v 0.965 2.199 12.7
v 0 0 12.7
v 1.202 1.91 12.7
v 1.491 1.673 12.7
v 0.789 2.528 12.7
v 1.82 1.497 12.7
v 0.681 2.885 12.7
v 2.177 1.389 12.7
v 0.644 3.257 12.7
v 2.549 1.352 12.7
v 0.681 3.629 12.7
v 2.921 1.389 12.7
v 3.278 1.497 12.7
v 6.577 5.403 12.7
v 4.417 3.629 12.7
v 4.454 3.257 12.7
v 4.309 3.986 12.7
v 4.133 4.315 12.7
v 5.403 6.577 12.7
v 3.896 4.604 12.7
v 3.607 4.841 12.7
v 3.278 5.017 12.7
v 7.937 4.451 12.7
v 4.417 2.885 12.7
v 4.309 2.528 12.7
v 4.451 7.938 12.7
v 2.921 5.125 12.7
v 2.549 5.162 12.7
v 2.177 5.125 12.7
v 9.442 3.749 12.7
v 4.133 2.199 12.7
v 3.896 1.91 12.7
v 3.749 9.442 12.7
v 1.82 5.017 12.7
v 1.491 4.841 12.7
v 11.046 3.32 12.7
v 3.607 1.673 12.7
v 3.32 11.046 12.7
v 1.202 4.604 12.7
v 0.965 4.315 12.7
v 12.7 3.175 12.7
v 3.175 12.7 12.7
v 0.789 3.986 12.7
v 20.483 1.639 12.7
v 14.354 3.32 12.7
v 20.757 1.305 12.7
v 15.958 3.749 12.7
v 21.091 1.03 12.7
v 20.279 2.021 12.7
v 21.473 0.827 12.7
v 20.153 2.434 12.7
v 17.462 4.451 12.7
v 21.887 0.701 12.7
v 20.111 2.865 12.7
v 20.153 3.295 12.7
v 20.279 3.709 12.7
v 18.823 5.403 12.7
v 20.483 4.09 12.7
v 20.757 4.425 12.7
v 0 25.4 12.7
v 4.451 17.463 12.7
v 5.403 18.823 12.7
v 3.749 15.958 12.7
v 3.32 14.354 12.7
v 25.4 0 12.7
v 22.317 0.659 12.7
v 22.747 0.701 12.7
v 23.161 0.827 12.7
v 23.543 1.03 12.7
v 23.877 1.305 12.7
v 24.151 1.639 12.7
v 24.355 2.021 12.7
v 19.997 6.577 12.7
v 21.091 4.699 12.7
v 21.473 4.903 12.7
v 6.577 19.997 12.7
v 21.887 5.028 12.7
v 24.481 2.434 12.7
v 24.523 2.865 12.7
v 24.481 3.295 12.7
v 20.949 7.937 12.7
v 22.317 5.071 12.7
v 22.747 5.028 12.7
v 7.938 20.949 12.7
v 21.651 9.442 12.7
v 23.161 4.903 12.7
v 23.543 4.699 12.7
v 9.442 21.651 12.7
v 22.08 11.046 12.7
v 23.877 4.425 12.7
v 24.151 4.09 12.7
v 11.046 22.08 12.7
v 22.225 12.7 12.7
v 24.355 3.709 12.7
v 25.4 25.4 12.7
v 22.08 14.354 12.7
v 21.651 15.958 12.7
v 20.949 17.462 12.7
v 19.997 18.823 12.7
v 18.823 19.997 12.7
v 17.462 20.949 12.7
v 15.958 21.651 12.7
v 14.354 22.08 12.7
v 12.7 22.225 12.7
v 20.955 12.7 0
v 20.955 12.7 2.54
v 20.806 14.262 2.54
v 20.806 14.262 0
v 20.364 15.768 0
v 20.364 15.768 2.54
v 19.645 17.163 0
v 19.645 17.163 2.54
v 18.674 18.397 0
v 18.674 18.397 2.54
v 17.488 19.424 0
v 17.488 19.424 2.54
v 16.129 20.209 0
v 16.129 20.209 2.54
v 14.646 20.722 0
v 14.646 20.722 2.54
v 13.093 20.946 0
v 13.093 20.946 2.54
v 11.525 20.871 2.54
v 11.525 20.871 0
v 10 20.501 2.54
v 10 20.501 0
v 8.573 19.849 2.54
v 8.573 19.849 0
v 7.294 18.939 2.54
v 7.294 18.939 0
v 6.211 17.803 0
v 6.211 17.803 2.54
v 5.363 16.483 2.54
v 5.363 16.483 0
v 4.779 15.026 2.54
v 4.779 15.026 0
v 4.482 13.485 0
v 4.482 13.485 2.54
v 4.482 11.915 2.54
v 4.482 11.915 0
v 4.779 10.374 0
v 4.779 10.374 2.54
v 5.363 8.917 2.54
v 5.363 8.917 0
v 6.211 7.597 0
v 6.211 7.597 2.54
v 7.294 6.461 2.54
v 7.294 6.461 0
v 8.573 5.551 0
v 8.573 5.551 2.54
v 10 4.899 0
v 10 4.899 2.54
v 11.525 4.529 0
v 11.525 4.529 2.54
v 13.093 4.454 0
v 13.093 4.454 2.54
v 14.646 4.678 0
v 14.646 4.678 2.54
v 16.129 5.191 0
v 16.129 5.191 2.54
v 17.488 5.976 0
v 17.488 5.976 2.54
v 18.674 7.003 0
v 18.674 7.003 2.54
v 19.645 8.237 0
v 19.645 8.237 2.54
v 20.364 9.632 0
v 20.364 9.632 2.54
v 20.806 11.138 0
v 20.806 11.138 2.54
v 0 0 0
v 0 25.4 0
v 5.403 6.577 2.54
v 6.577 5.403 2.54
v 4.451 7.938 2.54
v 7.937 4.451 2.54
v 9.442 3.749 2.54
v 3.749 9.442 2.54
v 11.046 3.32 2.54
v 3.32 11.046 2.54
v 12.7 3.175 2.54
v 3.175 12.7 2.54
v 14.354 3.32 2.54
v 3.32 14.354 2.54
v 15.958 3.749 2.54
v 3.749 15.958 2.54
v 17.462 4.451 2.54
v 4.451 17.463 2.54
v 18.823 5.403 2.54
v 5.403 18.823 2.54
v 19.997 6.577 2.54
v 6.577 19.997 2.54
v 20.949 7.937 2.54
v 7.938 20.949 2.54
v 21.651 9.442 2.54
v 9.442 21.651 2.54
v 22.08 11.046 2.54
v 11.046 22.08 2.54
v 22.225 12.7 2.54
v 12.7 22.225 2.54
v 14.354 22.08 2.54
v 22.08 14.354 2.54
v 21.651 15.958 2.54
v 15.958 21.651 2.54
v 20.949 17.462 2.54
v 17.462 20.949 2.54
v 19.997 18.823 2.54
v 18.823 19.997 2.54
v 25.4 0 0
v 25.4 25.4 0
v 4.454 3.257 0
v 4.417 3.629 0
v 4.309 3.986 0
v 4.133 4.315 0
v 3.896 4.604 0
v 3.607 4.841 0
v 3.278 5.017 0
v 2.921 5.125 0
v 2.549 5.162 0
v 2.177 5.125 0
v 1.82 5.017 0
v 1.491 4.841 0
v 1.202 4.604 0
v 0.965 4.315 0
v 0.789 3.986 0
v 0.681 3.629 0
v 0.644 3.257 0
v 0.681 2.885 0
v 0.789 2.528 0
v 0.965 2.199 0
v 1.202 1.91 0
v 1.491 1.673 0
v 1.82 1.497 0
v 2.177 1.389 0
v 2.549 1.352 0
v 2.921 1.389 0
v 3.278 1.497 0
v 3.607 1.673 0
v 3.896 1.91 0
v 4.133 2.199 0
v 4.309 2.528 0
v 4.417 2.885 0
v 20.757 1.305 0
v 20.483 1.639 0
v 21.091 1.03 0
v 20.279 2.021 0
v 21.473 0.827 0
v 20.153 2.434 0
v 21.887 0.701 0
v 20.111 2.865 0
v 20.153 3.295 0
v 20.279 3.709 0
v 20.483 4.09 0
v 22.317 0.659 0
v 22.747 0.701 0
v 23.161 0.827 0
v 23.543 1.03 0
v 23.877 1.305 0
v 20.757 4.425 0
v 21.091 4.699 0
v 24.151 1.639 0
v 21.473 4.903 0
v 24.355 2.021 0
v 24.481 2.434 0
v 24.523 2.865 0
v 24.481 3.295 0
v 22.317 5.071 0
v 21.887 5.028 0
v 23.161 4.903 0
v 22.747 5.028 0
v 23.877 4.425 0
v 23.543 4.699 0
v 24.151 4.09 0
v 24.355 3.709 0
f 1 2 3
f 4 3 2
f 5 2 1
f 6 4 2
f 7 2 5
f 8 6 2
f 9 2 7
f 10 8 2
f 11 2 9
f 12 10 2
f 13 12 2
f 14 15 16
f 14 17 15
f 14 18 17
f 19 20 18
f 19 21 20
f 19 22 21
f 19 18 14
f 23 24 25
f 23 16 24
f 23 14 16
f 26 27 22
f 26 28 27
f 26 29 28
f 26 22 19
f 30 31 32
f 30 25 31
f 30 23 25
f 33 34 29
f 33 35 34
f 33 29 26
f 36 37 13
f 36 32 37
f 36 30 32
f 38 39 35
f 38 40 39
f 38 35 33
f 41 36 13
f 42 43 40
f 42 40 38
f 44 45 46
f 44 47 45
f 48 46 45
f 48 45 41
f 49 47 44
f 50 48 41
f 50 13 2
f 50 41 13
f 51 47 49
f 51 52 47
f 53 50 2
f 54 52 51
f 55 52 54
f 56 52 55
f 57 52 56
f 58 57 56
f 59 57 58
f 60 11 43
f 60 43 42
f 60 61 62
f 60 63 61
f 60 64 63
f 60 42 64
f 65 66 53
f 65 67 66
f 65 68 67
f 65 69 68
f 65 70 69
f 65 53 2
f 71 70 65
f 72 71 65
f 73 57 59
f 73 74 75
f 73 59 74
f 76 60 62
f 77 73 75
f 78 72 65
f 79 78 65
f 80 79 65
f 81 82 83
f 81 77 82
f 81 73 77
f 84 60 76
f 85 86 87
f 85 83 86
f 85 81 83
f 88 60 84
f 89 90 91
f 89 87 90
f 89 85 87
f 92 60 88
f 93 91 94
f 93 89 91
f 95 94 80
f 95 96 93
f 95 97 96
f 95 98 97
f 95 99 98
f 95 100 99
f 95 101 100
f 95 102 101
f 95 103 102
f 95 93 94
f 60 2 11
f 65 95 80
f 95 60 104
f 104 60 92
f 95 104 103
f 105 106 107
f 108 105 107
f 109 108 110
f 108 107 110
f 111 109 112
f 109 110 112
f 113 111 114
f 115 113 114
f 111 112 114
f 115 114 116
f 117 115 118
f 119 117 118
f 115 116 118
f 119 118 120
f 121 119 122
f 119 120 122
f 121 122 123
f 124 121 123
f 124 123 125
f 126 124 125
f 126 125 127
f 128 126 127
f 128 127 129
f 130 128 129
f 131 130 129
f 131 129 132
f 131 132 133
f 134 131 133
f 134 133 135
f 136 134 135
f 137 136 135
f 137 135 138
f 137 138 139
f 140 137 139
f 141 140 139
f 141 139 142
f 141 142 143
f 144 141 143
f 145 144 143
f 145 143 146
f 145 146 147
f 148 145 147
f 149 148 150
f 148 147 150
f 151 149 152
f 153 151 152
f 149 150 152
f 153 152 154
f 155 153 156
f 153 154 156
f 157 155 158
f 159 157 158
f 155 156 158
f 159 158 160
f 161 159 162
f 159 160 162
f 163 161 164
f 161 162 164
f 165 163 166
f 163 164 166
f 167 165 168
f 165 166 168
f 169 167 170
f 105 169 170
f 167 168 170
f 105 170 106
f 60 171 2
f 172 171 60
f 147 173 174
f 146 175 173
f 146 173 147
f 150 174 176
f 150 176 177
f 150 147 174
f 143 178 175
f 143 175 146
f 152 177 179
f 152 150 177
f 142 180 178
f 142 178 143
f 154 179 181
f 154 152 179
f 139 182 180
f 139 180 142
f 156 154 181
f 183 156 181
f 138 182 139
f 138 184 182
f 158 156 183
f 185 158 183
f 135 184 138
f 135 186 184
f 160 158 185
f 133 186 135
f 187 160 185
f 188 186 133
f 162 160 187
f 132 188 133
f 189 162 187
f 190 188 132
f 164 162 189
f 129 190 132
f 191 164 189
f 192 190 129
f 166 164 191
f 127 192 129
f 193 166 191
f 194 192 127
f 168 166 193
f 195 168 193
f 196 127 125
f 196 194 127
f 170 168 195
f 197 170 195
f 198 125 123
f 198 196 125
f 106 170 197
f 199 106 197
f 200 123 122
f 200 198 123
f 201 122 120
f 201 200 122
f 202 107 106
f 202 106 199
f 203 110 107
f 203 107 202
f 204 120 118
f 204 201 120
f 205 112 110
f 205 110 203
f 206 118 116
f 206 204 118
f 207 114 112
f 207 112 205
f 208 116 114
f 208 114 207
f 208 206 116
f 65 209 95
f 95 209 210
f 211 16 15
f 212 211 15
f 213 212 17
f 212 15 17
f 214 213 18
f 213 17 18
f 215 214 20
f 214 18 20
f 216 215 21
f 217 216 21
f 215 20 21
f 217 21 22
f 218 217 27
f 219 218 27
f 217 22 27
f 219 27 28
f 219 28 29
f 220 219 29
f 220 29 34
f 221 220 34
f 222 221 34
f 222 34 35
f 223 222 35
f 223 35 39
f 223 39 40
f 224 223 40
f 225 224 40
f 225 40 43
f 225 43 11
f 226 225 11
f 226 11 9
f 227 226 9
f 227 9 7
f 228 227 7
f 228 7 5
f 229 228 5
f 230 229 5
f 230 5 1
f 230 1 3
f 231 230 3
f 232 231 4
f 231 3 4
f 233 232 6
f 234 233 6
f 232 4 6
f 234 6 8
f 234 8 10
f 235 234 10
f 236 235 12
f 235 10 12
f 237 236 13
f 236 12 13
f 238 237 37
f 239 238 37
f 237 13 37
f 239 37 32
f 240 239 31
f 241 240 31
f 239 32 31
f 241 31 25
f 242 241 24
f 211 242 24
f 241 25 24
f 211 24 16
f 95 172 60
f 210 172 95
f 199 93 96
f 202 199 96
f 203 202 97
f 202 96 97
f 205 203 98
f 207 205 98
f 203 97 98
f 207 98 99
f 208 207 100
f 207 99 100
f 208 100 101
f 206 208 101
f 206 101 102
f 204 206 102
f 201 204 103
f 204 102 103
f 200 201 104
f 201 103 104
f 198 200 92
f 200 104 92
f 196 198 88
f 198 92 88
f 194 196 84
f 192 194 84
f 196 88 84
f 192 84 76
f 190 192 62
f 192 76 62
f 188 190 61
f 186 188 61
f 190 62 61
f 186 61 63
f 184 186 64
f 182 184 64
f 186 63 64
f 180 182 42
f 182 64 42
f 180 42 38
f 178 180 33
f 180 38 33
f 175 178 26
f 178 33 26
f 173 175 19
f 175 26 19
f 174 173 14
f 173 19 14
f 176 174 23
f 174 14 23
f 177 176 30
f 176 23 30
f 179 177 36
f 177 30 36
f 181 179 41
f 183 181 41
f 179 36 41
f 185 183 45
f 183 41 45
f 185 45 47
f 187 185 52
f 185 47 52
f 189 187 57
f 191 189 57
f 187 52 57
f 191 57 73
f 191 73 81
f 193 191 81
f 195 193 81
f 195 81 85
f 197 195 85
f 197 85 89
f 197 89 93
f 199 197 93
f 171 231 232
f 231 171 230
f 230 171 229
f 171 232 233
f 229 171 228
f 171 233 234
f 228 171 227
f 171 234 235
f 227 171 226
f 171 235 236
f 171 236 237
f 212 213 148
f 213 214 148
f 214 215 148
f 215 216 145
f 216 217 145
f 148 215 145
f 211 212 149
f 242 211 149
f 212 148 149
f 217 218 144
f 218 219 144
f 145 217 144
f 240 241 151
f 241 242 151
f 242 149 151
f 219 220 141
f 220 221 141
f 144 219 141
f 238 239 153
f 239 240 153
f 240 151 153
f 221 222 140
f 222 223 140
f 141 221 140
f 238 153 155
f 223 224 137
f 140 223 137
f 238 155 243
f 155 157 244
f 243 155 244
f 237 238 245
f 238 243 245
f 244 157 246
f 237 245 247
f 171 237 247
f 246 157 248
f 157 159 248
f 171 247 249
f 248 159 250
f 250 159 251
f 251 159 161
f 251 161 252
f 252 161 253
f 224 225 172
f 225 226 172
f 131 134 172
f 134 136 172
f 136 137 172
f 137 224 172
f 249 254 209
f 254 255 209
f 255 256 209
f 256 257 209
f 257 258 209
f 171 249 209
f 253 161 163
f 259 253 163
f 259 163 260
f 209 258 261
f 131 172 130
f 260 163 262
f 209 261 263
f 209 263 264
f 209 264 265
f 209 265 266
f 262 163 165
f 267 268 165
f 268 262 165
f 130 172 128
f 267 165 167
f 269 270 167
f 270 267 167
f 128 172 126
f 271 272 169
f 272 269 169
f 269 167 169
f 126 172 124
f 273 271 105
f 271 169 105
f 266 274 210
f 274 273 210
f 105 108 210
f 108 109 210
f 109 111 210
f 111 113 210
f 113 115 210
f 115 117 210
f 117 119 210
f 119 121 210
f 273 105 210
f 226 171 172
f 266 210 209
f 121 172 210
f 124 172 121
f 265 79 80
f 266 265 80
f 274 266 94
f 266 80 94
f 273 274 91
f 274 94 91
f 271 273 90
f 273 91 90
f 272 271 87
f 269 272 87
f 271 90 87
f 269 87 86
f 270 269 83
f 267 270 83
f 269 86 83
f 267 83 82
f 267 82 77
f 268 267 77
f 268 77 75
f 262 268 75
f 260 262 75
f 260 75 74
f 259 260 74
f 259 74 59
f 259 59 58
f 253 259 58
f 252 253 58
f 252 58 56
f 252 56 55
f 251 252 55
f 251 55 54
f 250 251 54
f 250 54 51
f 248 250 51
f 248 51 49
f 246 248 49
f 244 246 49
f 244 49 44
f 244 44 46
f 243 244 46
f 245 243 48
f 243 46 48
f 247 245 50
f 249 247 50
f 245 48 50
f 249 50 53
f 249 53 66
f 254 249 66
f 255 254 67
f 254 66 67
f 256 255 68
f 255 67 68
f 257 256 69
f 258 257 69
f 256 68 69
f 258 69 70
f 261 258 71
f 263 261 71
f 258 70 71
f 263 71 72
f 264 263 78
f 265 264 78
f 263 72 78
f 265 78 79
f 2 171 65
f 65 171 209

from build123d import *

# Parameters (mm, degrees)
F0_W     = 25.4
F0_H     = 25.4
F1_DEPTH = 12.7
F2_R     = 9.525
F3_DEPTH = 10.16
F4_R     = 8.255
F5_DEPTH = 2.541
F6_R     = 1.905
F7_DEPTH = 12.701
F8_R     = 2.205983
F9_DEPTH = 12.701


with BuildPart() as f1:
    # F0 (on Top) → F1 (new body)
    with BuildSketch(Plane.XY):
        with Locations((12.7, 12.7)):
            Rectangle(F0_W, F0_H)
    extrude(amount=F1_DEPTH)

    # F2 (on face) → F3 (cut)
    with BuildSketch(Plane.XY.offset(12.7)):
        with Locations((12.7, 12.7)):
            Circle(F2_R)
    extrude(amount=-F3_DEPTH, mode=Mode.SUBTRACT)

    # F4 (on face) → F5 (cut, through all)
    with BuildSketch(Plane.XY.offset(2.54)):
        with Locations((12.7, 12.7)):
            Circle(F4_R)
    extrude(amount=-F5_DEPTH, mode=Mode.SUBTRACT)

    # F6 (on face) → F7 (cut, through all)
    with BuildSketch(Plane.XY.offset(12.7)):
        with Locations((2.54899, 3.257044)):
            Circle(F6_R)
    extrude(amount=-F7_DEPTH, mode=Mode.SUBTRACT)

    # F8 (on face) → F9 (cut, through all)
    with BuildSketch(Plane.XY.offset(12.7)):
        with Locations((22.317057, 2.864695)):
            Circle(F8_R)
    extrude(amount=-F9_DEPTH, mode=Mode.SUBTRACT)


solid = f1.part
